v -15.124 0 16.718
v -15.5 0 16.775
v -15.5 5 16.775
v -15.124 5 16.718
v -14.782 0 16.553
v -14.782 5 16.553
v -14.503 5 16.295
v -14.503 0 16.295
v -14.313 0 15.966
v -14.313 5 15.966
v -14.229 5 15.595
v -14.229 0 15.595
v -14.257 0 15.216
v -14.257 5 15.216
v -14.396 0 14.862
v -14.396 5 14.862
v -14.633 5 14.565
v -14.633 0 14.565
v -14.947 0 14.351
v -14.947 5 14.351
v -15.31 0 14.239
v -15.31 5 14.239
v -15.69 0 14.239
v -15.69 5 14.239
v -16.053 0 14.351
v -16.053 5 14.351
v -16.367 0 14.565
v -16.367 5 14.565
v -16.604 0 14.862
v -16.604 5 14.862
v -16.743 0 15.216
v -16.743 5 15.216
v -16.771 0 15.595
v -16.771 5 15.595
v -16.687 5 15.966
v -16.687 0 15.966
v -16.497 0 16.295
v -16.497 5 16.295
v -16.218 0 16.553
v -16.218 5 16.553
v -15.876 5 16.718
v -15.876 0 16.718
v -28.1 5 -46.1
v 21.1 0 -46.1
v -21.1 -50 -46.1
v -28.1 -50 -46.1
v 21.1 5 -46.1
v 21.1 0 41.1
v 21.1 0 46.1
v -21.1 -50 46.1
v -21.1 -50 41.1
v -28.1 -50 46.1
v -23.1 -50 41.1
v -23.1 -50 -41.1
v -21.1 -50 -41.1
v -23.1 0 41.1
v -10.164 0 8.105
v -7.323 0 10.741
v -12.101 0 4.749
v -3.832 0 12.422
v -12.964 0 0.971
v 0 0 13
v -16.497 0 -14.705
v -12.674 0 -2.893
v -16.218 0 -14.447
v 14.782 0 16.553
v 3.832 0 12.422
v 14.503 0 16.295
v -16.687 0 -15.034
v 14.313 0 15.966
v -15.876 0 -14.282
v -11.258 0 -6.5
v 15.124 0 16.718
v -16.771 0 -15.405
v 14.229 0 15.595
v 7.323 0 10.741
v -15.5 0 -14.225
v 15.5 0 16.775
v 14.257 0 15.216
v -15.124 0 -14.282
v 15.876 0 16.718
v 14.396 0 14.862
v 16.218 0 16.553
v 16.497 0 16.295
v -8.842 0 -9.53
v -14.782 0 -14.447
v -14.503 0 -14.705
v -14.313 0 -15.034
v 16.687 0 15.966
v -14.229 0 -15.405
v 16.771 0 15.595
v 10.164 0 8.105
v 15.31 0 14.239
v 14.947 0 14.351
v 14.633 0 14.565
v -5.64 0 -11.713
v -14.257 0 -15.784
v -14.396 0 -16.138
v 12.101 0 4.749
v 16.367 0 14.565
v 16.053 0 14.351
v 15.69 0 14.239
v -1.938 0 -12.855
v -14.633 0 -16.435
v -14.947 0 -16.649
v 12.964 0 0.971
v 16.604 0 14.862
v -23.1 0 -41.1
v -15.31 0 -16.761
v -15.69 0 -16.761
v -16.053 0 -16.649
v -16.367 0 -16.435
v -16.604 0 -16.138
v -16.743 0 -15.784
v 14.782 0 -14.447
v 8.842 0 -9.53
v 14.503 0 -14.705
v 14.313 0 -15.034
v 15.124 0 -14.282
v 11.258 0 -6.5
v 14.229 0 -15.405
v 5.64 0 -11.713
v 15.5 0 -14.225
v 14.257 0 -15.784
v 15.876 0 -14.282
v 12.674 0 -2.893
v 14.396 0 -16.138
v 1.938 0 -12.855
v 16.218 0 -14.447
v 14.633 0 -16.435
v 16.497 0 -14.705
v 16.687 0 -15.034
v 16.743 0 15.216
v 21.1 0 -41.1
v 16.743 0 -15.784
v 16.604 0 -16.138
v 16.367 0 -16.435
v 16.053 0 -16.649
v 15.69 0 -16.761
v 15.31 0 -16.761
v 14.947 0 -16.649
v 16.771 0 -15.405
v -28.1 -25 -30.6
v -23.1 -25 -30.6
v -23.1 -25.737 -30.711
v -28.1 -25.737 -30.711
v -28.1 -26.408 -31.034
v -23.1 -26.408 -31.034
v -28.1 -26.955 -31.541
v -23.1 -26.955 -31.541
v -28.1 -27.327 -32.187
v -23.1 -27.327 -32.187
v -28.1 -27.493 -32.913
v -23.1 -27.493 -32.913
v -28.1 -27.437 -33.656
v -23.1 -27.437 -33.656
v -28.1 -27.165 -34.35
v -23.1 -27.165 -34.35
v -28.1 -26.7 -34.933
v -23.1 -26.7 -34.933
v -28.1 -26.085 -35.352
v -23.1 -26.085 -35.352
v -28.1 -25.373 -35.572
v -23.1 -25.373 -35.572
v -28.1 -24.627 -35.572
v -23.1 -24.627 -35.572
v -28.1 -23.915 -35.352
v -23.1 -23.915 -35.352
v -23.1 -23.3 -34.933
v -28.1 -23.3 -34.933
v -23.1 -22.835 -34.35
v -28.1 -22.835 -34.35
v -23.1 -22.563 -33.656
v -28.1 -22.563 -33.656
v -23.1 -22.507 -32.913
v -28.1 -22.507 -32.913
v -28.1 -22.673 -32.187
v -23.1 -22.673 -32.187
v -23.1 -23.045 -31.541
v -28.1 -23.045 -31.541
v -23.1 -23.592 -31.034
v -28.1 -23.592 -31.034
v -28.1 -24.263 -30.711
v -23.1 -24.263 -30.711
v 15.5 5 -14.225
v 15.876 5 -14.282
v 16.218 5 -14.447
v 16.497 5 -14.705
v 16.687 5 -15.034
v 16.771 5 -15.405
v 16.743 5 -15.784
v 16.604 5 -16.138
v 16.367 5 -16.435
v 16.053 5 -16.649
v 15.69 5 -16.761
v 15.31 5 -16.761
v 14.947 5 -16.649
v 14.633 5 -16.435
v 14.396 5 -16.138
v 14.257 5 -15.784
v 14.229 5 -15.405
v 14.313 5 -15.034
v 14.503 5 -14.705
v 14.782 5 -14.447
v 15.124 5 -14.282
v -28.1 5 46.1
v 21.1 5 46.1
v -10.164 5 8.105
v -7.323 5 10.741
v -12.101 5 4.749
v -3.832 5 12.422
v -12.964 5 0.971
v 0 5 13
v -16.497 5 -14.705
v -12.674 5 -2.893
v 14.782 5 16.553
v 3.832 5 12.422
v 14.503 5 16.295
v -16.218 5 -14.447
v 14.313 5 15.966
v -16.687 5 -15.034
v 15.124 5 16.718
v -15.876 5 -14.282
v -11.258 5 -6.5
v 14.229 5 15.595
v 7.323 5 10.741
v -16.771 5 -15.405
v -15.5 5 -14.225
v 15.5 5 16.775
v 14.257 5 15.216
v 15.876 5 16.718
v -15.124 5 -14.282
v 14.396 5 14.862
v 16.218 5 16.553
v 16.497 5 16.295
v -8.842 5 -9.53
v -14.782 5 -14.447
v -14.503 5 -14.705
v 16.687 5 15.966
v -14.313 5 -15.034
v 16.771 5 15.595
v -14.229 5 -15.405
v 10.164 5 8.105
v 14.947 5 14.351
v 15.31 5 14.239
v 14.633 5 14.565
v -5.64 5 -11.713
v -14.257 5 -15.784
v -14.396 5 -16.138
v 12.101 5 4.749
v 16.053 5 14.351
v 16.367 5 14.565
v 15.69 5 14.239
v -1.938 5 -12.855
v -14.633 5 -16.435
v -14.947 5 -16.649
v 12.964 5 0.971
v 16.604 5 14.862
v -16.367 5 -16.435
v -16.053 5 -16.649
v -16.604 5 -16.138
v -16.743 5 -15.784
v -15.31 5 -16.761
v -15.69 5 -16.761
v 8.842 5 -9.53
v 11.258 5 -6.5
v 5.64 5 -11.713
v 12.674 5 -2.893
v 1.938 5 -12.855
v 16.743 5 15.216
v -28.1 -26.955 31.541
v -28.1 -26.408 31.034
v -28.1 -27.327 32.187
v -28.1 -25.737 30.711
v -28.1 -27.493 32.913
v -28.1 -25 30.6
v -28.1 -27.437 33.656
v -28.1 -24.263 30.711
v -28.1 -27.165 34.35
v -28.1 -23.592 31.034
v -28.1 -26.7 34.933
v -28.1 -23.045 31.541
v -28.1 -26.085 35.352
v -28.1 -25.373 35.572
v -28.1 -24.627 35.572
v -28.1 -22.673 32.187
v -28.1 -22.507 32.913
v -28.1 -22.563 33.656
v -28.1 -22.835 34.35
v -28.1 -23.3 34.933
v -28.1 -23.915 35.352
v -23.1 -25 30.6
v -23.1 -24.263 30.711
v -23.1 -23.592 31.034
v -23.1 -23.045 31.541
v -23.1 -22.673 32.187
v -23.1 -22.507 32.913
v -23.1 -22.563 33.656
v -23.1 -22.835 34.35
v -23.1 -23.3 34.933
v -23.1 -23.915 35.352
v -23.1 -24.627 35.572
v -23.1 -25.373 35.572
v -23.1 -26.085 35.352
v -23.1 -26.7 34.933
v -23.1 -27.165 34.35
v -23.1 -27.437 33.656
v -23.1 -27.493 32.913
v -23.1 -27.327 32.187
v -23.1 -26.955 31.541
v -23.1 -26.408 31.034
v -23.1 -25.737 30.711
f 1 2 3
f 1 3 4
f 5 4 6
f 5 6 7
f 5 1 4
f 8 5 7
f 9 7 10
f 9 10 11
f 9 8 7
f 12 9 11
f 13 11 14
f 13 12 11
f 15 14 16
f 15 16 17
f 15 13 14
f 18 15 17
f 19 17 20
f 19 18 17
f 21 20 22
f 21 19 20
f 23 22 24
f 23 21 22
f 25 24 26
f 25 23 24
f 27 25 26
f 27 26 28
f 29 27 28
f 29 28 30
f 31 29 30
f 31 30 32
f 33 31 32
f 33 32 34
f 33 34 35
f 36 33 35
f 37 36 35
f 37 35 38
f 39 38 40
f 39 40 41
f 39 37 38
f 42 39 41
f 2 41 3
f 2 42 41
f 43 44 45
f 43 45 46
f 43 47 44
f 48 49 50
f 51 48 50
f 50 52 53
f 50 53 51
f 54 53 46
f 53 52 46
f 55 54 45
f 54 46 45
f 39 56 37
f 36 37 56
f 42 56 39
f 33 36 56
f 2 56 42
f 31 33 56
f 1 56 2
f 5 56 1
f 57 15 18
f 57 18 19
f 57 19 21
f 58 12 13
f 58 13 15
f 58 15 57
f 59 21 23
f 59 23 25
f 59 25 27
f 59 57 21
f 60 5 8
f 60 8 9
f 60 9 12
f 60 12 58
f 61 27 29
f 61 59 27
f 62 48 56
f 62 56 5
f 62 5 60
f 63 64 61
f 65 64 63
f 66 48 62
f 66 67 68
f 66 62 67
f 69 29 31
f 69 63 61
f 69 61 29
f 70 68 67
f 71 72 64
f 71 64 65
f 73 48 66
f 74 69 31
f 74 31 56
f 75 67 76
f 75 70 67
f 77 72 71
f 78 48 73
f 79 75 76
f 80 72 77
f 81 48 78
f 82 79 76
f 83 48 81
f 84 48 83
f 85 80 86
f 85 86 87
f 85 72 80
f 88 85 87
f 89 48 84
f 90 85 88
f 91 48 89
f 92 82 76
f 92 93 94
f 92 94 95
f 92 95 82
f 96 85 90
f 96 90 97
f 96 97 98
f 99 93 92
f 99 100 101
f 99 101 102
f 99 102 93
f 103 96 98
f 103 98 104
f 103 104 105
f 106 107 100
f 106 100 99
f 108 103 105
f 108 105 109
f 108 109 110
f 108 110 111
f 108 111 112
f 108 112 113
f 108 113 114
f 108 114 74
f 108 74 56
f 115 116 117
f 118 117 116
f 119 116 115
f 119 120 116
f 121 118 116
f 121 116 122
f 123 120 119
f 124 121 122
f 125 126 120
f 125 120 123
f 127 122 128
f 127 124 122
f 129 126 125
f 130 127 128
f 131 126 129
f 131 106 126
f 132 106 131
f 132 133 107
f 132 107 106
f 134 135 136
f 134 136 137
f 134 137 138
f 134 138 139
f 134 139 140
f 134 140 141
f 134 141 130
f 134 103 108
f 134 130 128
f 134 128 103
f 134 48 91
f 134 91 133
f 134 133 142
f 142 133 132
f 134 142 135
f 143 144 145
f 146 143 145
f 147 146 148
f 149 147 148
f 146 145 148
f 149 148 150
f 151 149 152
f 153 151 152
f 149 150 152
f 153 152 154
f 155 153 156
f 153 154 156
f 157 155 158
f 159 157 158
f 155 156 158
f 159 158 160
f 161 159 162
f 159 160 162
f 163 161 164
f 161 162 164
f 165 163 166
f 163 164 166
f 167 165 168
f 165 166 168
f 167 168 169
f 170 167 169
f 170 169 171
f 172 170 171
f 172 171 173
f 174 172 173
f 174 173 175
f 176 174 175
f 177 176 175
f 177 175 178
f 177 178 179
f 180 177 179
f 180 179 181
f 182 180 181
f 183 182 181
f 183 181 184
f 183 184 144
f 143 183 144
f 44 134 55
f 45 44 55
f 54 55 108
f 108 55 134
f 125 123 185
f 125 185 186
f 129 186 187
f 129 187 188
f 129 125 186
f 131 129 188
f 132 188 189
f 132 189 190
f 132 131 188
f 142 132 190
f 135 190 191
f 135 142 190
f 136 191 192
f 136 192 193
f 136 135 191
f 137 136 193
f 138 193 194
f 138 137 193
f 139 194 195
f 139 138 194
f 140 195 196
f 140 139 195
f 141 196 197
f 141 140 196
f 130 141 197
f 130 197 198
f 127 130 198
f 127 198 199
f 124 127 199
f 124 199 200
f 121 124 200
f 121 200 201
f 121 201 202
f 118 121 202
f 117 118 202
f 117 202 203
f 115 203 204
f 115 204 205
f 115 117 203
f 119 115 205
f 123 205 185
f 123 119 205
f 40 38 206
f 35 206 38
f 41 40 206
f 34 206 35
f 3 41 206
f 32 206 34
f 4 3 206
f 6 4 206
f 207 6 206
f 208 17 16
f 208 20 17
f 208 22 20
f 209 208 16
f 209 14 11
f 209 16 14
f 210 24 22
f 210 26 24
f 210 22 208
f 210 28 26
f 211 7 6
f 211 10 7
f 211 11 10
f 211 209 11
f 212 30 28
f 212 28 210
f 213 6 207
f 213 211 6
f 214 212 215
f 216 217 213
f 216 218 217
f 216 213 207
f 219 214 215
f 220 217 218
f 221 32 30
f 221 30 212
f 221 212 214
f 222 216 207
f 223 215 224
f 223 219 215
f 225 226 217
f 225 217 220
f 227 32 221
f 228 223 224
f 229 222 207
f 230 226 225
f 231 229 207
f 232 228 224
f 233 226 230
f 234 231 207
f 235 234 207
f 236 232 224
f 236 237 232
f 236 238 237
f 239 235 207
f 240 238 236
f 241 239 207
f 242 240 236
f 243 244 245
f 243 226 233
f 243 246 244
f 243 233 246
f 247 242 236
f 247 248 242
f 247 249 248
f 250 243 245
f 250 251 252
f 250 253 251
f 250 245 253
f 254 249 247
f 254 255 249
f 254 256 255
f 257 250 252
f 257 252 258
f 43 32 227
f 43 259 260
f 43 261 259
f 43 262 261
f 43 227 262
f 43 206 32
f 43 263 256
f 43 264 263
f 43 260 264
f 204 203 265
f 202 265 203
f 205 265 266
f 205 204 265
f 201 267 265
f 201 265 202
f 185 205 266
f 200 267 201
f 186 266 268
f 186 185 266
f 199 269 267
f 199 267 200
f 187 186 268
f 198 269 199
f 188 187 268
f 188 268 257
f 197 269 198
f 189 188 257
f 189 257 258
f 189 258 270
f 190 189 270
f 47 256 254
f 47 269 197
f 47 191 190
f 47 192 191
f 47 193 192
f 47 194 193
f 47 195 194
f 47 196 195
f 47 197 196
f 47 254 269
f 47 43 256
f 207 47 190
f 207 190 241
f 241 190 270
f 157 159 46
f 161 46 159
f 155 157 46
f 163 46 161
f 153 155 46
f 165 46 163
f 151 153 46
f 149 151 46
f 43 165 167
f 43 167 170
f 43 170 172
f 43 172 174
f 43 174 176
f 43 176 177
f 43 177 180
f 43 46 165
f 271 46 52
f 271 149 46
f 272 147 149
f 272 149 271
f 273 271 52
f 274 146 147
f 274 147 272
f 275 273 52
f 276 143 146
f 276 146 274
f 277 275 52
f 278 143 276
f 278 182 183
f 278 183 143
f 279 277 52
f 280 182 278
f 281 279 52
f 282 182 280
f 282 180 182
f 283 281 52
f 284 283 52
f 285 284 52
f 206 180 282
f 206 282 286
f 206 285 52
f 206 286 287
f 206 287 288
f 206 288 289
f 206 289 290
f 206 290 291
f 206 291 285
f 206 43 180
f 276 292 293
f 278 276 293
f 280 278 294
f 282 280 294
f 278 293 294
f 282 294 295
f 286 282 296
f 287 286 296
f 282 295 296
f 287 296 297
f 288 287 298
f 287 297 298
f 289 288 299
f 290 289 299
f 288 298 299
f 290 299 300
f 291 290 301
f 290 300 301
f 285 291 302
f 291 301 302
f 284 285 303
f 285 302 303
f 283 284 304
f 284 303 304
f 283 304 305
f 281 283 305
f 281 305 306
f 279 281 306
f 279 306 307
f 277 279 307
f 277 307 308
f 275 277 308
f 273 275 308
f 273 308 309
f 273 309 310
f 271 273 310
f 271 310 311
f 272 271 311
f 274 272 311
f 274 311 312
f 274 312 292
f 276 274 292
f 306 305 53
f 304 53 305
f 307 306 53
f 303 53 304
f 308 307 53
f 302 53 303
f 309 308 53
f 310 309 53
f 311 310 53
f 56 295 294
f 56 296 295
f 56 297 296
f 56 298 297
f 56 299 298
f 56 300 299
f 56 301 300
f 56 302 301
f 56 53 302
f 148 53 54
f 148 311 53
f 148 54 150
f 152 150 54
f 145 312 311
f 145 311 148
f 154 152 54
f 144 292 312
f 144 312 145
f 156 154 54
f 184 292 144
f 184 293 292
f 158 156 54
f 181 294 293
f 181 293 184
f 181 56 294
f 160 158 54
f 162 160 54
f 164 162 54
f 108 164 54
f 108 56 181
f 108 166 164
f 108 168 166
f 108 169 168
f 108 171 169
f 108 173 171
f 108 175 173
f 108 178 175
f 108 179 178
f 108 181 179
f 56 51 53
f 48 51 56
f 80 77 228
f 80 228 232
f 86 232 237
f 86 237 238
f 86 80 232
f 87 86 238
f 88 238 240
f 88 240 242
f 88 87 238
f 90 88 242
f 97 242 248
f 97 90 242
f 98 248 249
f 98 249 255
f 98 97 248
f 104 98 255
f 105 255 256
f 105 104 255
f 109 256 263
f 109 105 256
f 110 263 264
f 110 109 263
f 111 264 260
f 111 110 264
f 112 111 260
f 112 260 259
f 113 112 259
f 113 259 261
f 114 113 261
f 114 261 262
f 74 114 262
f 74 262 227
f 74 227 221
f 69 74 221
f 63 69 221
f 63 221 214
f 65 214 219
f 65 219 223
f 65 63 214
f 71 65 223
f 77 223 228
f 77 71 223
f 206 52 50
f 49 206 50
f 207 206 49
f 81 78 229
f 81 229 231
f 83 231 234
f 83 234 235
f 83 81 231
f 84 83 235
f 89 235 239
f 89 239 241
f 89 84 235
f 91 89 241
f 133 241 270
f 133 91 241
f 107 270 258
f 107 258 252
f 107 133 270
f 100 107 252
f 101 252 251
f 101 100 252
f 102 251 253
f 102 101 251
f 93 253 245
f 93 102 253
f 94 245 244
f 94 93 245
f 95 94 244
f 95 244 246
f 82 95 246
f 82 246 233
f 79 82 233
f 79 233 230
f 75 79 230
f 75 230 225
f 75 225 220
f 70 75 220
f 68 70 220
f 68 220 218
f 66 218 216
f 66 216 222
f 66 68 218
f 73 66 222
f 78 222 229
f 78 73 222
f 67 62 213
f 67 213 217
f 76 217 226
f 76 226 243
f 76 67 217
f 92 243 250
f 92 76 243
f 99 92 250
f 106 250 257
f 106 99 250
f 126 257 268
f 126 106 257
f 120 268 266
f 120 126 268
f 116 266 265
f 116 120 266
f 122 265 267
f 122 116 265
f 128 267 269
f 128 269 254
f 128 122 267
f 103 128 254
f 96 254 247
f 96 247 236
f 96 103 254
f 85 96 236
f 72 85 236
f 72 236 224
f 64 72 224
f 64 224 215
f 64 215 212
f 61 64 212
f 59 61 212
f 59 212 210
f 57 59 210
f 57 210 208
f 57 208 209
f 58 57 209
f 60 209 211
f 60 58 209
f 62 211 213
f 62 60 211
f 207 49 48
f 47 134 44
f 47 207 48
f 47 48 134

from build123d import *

# Parameters (mm, degrees)
SKETCH1_W           = 49.2
SKETCH1_H           = 92.2
SKETCH1_R           = 1.275
SKETCH1_R_2         = 13
BOSS_EXTRUDE3_DEPTH = 5
BOSS_EXTRUDE4_DEPTH = 50
CUT_EXTRUDE1_DEPTH  = 109.583838576
SKETCH3_R           = 2.5
CUT_EXTRUDE2_DEPTH  = 81.037803568
SKETCH5_W           = 82.2
SKETCH5_H           = 50
SKETCH5_R           = 2.5
CUT_EXTRUDE3_DEPTH  = 2


with BuildPart() as part:
    # Sketch1 → Boss-Extrude3 (new body)
    with BuildSketch(Plane(origin=(0, 0, 0), x_dir=(1, 0, 0), z_dir=(0, 1, 0))):
        with Locations((-3.5, 0)):
            Rectangle(SKETCH1_W, SKETCH1_H)
        with Locations((-15.5, -15.5)):
            Circle(SKETCH1_R, mode=Mode.SUBTRACT)
        with Locations((15.5, -15.5)):
            Circle(SKETCH1_R, mode=Mode.SUBTRACT)
        with Locations((-15.5, 15.5)):
            Circle(SKETCH1_R, mode=Mode.SUBTRACT)
        Circle(SKETCH1_R_2, mode=Mode.SUBTRACT)
        with Locations((15.5, 15.5)):
            Circle(SKETCH1_R, mode=Mode.SUBTRACT)
    extrude(amount=BOSS_EXTRUDE3_DEPTH)

    # Sketch1<3> → Boss-Extrude4 (add)
    with BuildSketch(Plane(origin=(0, 0, 0), x_dir=(1, 0, 0), z_dir=(0, 1, 0))):
        Polygon((-21.1, 41.1), (21.1, 41.1), (21.1, 46.1), (-28.1, 46.1), (-28.1, -46.1), (21.1, -46.1), (21.1, -41.1), (-21.1, -41.1), align=None)
    extrude(amount=-BOSS_EXTRUDE4_DEPTH)

    # Sketch2 → Cut-Extrude1 (cut, through all)
    with BuildSketch(Plane.XY.offset(46.1)):
        Polygon((21.1, 0), (-21.1, -50), (21.1, -50), align=None)
    extrude(amount=-CUT_EXTRUDE1_DEPTH, mode=Mode.SUBTRACT)

    # Sketch3 → Cut-Extrude2 (cut, through all)
    with BuildSketch(Plane(origin=(-21.1, 0, 0), x_dir=(0, 0, -1), z_dir=(1, 0, 0))):
        with Locations((-33.1, -25)):
            Circle(SKETCH3_R)
        with Locations((33.1, -25)):
            Circle(SKETCH3_R)
    extrude(amount=-CUT_EXTRUDE2_DEPTH, mode=Mode.SUBTRACT)

    # Sketch5 → Cut-Extrude3 (cut)
    with BuildSketch(Plane(origin=(-21.1, 0, 0), x_dir=(0, 0, -1), z_dir=(1, 0, 0))):
        with Locations((0, -25)):
            Rectangle(SKETCH5_W, SKETCH5_H)
        with Locations((33.1, -25)):
            Circle(SKETCH5_R, mode=Mode.SUBTRACT)
        with Locations((-33.1, -25)):
            Circle(SKETCH5_R, mode=Mode.SUBTRACT)
    extrude(amount=-CUT_EXTRUDE3_DEPTH, mode=Mode.SUBTRACT)


solid = part.part
